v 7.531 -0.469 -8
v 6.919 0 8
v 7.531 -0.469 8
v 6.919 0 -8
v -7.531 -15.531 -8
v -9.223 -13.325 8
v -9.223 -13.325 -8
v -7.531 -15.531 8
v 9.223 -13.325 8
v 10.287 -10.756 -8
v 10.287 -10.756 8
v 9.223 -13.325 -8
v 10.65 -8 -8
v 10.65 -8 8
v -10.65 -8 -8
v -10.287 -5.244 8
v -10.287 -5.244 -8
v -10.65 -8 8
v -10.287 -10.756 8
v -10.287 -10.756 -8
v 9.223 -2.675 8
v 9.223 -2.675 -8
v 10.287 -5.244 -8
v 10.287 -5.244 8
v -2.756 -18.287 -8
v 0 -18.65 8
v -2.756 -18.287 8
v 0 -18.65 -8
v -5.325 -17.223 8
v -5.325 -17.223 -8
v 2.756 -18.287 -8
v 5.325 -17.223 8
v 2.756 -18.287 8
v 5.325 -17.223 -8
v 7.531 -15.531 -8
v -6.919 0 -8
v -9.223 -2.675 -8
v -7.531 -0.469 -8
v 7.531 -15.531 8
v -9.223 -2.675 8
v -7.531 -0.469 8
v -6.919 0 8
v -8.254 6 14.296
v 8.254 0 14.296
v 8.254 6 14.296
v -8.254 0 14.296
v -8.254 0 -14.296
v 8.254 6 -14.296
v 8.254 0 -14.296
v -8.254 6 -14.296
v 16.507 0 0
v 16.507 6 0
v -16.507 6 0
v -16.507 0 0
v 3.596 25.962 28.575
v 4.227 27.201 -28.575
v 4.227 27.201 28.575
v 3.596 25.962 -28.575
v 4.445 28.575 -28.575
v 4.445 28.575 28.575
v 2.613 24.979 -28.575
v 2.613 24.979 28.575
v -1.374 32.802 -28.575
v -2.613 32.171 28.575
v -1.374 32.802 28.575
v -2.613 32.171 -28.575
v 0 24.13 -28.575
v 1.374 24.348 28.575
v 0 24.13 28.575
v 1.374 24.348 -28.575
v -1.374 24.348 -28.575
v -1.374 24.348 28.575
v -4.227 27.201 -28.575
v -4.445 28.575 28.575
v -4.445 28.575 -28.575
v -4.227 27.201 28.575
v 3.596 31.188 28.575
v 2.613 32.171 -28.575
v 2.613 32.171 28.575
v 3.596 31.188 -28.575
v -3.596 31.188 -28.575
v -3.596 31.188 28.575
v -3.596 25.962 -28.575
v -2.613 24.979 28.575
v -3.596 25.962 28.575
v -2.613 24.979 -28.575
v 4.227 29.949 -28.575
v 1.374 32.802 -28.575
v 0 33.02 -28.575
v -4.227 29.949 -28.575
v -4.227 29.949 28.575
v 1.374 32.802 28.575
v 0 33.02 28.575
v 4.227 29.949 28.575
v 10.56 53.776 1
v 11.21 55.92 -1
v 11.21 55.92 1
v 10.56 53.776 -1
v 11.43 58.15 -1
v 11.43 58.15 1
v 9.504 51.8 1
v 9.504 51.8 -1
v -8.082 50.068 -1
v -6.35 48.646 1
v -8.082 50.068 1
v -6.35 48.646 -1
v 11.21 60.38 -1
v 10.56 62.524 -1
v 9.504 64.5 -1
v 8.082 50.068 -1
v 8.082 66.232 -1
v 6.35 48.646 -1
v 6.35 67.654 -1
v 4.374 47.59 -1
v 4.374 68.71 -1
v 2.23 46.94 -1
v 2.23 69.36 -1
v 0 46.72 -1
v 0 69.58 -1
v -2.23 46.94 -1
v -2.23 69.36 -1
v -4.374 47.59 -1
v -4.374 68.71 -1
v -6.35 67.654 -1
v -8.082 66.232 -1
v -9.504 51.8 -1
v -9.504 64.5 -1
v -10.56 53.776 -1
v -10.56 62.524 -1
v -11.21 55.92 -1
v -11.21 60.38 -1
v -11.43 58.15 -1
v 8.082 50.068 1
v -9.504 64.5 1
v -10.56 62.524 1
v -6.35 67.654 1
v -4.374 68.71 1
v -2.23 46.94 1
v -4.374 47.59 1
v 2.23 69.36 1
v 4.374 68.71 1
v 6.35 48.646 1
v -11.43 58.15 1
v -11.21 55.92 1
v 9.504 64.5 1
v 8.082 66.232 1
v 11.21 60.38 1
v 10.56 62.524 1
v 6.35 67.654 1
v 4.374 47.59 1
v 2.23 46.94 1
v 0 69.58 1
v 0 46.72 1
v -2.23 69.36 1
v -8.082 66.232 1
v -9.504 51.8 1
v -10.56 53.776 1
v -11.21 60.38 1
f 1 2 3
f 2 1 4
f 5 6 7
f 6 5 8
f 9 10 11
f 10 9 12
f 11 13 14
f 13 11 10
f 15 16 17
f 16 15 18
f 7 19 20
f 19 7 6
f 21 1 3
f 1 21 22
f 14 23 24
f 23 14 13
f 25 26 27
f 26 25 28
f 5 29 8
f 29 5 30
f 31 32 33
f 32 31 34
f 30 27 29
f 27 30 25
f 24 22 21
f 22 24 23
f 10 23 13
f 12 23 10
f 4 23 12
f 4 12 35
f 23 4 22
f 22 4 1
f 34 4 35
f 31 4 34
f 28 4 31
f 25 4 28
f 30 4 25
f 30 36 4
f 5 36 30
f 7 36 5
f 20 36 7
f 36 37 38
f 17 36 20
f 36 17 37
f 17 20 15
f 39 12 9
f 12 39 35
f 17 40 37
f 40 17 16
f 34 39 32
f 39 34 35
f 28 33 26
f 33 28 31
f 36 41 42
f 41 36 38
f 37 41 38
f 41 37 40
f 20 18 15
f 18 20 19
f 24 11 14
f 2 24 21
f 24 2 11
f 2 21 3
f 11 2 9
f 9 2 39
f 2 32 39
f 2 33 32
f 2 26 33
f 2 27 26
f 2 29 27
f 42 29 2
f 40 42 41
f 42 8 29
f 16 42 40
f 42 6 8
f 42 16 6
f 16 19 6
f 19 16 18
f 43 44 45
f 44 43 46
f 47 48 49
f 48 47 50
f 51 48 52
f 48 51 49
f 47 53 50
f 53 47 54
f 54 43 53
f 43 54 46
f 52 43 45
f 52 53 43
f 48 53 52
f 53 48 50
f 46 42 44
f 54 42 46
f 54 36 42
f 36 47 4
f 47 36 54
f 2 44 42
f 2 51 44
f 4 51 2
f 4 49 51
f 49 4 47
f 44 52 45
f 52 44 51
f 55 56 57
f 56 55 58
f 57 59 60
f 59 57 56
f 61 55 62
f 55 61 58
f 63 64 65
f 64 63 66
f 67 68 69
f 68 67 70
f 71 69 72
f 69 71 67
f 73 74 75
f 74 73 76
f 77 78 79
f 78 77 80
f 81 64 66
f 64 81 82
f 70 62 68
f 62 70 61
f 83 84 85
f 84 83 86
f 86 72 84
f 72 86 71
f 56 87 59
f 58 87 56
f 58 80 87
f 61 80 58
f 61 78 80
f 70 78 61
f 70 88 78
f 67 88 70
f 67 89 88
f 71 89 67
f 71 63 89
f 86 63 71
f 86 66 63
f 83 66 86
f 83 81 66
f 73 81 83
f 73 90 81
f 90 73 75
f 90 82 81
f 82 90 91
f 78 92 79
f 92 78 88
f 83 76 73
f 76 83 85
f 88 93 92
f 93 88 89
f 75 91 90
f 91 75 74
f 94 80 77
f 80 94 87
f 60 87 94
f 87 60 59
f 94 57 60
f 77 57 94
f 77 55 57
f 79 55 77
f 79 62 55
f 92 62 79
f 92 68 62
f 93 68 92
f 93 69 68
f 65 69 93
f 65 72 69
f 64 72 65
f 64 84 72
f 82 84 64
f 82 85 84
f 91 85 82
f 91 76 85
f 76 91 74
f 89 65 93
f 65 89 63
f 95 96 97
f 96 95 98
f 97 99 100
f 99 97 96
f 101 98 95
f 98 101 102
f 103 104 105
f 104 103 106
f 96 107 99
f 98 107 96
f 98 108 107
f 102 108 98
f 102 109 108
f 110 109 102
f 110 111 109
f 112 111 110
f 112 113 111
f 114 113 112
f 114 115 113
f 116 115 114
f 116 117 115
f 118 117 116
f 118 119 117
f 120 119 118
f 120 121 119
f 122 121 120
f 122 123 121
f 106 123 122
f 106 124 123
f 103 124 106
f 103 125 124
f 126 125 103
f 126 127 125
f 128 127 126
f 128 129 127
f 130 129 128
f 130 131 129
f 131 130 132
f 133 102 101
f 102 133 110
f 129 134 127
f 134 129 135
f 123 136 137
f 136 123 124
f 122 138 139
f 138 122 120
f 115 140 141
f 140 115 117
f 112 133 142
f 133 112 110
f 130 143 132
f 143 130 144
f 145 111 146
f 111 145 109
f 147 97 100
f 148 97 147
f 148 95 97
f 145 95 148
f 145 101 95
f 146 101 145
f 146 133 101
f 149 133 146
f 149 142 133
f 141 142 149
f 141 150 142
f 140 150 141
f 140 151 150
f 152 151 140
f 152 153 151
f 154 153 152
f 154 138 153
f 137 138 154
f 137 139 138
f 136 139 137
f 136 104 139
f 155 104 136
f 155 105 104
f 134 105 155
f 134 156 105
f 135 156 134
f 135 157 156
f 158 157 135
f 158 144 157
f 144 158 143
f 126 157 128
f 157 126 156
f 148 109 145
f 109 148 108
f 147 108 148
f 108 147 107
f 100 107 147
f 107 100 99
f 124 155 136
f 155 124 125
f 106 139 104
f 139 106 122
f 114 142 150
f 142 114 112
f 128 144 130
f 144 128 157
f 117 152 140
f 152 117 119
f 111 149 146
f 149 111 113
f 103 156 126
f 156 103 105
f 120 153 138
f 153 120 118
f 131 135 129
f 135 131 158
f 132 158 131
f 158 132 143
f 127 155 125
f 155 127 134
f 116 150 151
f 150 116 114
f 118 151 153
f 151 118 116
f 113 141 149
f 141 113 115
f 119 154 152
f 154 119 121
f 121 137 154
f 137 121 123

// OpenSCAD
// Auto-generated by scripts/author_from_manifest.py (Phase D.3).
// Source: data/phase_d_manifest.json (sku_intent='reliable-f156-upright-175f').
// Do not hand-edit — regenerate from the manifest.
//
// @part reliable_f156_upright_175f
// @kind sprinkler_head
// @category head.upright.k56
// @display-name "Reliable F1-56 Upright K5.6 SR 175°F"
// @mfg reliable_automatic_sprinkler
// @mfg-pn F1-56
// @listing UL FM
// @hazard-classes LH OH1
// @price-usd 12.75
// @install-minutes 8
// @crew journeyman
// @k-factor 5.6
// @orientation upright
// @response standard
// @temperature 175F
// @param size_in number default=0.5 label="Size" unit="in"
// @port inlet position=[0,0.014,0] direction=[0,1,0] style=NPT_threaded size_in=0.5 role=drop

size_in = 0.5;
k_factor = 5.6;

length_mm   = 57.15;
body_dia_mm = 25.40;
thread_od   = 21.3;
thread_len  = 16;
deflector_d = body_dia_mm * 0.9;

rotate([180,0,0]) union() {
    translate([0, thread_len/2, 0])
        cylinder(h = thread_len, d = thread_od, center = true, $fn = 24);
    translate([0, -3, 0])
        rotate([90, 0, 0])
        cylinder(h = 6, d = thread_od * 1.55, $fn = 6, center = true);
    translate([0, -length_mm/2, 0])
        cylinder(h = length_mm, d = body_dia_mm * 0.35, center = true, $fn = 20);
    translate([0, -length_mm - 1, 0])
        cylinder(h = 2, d = deflector_d, center = true, $fn = 32);
}
